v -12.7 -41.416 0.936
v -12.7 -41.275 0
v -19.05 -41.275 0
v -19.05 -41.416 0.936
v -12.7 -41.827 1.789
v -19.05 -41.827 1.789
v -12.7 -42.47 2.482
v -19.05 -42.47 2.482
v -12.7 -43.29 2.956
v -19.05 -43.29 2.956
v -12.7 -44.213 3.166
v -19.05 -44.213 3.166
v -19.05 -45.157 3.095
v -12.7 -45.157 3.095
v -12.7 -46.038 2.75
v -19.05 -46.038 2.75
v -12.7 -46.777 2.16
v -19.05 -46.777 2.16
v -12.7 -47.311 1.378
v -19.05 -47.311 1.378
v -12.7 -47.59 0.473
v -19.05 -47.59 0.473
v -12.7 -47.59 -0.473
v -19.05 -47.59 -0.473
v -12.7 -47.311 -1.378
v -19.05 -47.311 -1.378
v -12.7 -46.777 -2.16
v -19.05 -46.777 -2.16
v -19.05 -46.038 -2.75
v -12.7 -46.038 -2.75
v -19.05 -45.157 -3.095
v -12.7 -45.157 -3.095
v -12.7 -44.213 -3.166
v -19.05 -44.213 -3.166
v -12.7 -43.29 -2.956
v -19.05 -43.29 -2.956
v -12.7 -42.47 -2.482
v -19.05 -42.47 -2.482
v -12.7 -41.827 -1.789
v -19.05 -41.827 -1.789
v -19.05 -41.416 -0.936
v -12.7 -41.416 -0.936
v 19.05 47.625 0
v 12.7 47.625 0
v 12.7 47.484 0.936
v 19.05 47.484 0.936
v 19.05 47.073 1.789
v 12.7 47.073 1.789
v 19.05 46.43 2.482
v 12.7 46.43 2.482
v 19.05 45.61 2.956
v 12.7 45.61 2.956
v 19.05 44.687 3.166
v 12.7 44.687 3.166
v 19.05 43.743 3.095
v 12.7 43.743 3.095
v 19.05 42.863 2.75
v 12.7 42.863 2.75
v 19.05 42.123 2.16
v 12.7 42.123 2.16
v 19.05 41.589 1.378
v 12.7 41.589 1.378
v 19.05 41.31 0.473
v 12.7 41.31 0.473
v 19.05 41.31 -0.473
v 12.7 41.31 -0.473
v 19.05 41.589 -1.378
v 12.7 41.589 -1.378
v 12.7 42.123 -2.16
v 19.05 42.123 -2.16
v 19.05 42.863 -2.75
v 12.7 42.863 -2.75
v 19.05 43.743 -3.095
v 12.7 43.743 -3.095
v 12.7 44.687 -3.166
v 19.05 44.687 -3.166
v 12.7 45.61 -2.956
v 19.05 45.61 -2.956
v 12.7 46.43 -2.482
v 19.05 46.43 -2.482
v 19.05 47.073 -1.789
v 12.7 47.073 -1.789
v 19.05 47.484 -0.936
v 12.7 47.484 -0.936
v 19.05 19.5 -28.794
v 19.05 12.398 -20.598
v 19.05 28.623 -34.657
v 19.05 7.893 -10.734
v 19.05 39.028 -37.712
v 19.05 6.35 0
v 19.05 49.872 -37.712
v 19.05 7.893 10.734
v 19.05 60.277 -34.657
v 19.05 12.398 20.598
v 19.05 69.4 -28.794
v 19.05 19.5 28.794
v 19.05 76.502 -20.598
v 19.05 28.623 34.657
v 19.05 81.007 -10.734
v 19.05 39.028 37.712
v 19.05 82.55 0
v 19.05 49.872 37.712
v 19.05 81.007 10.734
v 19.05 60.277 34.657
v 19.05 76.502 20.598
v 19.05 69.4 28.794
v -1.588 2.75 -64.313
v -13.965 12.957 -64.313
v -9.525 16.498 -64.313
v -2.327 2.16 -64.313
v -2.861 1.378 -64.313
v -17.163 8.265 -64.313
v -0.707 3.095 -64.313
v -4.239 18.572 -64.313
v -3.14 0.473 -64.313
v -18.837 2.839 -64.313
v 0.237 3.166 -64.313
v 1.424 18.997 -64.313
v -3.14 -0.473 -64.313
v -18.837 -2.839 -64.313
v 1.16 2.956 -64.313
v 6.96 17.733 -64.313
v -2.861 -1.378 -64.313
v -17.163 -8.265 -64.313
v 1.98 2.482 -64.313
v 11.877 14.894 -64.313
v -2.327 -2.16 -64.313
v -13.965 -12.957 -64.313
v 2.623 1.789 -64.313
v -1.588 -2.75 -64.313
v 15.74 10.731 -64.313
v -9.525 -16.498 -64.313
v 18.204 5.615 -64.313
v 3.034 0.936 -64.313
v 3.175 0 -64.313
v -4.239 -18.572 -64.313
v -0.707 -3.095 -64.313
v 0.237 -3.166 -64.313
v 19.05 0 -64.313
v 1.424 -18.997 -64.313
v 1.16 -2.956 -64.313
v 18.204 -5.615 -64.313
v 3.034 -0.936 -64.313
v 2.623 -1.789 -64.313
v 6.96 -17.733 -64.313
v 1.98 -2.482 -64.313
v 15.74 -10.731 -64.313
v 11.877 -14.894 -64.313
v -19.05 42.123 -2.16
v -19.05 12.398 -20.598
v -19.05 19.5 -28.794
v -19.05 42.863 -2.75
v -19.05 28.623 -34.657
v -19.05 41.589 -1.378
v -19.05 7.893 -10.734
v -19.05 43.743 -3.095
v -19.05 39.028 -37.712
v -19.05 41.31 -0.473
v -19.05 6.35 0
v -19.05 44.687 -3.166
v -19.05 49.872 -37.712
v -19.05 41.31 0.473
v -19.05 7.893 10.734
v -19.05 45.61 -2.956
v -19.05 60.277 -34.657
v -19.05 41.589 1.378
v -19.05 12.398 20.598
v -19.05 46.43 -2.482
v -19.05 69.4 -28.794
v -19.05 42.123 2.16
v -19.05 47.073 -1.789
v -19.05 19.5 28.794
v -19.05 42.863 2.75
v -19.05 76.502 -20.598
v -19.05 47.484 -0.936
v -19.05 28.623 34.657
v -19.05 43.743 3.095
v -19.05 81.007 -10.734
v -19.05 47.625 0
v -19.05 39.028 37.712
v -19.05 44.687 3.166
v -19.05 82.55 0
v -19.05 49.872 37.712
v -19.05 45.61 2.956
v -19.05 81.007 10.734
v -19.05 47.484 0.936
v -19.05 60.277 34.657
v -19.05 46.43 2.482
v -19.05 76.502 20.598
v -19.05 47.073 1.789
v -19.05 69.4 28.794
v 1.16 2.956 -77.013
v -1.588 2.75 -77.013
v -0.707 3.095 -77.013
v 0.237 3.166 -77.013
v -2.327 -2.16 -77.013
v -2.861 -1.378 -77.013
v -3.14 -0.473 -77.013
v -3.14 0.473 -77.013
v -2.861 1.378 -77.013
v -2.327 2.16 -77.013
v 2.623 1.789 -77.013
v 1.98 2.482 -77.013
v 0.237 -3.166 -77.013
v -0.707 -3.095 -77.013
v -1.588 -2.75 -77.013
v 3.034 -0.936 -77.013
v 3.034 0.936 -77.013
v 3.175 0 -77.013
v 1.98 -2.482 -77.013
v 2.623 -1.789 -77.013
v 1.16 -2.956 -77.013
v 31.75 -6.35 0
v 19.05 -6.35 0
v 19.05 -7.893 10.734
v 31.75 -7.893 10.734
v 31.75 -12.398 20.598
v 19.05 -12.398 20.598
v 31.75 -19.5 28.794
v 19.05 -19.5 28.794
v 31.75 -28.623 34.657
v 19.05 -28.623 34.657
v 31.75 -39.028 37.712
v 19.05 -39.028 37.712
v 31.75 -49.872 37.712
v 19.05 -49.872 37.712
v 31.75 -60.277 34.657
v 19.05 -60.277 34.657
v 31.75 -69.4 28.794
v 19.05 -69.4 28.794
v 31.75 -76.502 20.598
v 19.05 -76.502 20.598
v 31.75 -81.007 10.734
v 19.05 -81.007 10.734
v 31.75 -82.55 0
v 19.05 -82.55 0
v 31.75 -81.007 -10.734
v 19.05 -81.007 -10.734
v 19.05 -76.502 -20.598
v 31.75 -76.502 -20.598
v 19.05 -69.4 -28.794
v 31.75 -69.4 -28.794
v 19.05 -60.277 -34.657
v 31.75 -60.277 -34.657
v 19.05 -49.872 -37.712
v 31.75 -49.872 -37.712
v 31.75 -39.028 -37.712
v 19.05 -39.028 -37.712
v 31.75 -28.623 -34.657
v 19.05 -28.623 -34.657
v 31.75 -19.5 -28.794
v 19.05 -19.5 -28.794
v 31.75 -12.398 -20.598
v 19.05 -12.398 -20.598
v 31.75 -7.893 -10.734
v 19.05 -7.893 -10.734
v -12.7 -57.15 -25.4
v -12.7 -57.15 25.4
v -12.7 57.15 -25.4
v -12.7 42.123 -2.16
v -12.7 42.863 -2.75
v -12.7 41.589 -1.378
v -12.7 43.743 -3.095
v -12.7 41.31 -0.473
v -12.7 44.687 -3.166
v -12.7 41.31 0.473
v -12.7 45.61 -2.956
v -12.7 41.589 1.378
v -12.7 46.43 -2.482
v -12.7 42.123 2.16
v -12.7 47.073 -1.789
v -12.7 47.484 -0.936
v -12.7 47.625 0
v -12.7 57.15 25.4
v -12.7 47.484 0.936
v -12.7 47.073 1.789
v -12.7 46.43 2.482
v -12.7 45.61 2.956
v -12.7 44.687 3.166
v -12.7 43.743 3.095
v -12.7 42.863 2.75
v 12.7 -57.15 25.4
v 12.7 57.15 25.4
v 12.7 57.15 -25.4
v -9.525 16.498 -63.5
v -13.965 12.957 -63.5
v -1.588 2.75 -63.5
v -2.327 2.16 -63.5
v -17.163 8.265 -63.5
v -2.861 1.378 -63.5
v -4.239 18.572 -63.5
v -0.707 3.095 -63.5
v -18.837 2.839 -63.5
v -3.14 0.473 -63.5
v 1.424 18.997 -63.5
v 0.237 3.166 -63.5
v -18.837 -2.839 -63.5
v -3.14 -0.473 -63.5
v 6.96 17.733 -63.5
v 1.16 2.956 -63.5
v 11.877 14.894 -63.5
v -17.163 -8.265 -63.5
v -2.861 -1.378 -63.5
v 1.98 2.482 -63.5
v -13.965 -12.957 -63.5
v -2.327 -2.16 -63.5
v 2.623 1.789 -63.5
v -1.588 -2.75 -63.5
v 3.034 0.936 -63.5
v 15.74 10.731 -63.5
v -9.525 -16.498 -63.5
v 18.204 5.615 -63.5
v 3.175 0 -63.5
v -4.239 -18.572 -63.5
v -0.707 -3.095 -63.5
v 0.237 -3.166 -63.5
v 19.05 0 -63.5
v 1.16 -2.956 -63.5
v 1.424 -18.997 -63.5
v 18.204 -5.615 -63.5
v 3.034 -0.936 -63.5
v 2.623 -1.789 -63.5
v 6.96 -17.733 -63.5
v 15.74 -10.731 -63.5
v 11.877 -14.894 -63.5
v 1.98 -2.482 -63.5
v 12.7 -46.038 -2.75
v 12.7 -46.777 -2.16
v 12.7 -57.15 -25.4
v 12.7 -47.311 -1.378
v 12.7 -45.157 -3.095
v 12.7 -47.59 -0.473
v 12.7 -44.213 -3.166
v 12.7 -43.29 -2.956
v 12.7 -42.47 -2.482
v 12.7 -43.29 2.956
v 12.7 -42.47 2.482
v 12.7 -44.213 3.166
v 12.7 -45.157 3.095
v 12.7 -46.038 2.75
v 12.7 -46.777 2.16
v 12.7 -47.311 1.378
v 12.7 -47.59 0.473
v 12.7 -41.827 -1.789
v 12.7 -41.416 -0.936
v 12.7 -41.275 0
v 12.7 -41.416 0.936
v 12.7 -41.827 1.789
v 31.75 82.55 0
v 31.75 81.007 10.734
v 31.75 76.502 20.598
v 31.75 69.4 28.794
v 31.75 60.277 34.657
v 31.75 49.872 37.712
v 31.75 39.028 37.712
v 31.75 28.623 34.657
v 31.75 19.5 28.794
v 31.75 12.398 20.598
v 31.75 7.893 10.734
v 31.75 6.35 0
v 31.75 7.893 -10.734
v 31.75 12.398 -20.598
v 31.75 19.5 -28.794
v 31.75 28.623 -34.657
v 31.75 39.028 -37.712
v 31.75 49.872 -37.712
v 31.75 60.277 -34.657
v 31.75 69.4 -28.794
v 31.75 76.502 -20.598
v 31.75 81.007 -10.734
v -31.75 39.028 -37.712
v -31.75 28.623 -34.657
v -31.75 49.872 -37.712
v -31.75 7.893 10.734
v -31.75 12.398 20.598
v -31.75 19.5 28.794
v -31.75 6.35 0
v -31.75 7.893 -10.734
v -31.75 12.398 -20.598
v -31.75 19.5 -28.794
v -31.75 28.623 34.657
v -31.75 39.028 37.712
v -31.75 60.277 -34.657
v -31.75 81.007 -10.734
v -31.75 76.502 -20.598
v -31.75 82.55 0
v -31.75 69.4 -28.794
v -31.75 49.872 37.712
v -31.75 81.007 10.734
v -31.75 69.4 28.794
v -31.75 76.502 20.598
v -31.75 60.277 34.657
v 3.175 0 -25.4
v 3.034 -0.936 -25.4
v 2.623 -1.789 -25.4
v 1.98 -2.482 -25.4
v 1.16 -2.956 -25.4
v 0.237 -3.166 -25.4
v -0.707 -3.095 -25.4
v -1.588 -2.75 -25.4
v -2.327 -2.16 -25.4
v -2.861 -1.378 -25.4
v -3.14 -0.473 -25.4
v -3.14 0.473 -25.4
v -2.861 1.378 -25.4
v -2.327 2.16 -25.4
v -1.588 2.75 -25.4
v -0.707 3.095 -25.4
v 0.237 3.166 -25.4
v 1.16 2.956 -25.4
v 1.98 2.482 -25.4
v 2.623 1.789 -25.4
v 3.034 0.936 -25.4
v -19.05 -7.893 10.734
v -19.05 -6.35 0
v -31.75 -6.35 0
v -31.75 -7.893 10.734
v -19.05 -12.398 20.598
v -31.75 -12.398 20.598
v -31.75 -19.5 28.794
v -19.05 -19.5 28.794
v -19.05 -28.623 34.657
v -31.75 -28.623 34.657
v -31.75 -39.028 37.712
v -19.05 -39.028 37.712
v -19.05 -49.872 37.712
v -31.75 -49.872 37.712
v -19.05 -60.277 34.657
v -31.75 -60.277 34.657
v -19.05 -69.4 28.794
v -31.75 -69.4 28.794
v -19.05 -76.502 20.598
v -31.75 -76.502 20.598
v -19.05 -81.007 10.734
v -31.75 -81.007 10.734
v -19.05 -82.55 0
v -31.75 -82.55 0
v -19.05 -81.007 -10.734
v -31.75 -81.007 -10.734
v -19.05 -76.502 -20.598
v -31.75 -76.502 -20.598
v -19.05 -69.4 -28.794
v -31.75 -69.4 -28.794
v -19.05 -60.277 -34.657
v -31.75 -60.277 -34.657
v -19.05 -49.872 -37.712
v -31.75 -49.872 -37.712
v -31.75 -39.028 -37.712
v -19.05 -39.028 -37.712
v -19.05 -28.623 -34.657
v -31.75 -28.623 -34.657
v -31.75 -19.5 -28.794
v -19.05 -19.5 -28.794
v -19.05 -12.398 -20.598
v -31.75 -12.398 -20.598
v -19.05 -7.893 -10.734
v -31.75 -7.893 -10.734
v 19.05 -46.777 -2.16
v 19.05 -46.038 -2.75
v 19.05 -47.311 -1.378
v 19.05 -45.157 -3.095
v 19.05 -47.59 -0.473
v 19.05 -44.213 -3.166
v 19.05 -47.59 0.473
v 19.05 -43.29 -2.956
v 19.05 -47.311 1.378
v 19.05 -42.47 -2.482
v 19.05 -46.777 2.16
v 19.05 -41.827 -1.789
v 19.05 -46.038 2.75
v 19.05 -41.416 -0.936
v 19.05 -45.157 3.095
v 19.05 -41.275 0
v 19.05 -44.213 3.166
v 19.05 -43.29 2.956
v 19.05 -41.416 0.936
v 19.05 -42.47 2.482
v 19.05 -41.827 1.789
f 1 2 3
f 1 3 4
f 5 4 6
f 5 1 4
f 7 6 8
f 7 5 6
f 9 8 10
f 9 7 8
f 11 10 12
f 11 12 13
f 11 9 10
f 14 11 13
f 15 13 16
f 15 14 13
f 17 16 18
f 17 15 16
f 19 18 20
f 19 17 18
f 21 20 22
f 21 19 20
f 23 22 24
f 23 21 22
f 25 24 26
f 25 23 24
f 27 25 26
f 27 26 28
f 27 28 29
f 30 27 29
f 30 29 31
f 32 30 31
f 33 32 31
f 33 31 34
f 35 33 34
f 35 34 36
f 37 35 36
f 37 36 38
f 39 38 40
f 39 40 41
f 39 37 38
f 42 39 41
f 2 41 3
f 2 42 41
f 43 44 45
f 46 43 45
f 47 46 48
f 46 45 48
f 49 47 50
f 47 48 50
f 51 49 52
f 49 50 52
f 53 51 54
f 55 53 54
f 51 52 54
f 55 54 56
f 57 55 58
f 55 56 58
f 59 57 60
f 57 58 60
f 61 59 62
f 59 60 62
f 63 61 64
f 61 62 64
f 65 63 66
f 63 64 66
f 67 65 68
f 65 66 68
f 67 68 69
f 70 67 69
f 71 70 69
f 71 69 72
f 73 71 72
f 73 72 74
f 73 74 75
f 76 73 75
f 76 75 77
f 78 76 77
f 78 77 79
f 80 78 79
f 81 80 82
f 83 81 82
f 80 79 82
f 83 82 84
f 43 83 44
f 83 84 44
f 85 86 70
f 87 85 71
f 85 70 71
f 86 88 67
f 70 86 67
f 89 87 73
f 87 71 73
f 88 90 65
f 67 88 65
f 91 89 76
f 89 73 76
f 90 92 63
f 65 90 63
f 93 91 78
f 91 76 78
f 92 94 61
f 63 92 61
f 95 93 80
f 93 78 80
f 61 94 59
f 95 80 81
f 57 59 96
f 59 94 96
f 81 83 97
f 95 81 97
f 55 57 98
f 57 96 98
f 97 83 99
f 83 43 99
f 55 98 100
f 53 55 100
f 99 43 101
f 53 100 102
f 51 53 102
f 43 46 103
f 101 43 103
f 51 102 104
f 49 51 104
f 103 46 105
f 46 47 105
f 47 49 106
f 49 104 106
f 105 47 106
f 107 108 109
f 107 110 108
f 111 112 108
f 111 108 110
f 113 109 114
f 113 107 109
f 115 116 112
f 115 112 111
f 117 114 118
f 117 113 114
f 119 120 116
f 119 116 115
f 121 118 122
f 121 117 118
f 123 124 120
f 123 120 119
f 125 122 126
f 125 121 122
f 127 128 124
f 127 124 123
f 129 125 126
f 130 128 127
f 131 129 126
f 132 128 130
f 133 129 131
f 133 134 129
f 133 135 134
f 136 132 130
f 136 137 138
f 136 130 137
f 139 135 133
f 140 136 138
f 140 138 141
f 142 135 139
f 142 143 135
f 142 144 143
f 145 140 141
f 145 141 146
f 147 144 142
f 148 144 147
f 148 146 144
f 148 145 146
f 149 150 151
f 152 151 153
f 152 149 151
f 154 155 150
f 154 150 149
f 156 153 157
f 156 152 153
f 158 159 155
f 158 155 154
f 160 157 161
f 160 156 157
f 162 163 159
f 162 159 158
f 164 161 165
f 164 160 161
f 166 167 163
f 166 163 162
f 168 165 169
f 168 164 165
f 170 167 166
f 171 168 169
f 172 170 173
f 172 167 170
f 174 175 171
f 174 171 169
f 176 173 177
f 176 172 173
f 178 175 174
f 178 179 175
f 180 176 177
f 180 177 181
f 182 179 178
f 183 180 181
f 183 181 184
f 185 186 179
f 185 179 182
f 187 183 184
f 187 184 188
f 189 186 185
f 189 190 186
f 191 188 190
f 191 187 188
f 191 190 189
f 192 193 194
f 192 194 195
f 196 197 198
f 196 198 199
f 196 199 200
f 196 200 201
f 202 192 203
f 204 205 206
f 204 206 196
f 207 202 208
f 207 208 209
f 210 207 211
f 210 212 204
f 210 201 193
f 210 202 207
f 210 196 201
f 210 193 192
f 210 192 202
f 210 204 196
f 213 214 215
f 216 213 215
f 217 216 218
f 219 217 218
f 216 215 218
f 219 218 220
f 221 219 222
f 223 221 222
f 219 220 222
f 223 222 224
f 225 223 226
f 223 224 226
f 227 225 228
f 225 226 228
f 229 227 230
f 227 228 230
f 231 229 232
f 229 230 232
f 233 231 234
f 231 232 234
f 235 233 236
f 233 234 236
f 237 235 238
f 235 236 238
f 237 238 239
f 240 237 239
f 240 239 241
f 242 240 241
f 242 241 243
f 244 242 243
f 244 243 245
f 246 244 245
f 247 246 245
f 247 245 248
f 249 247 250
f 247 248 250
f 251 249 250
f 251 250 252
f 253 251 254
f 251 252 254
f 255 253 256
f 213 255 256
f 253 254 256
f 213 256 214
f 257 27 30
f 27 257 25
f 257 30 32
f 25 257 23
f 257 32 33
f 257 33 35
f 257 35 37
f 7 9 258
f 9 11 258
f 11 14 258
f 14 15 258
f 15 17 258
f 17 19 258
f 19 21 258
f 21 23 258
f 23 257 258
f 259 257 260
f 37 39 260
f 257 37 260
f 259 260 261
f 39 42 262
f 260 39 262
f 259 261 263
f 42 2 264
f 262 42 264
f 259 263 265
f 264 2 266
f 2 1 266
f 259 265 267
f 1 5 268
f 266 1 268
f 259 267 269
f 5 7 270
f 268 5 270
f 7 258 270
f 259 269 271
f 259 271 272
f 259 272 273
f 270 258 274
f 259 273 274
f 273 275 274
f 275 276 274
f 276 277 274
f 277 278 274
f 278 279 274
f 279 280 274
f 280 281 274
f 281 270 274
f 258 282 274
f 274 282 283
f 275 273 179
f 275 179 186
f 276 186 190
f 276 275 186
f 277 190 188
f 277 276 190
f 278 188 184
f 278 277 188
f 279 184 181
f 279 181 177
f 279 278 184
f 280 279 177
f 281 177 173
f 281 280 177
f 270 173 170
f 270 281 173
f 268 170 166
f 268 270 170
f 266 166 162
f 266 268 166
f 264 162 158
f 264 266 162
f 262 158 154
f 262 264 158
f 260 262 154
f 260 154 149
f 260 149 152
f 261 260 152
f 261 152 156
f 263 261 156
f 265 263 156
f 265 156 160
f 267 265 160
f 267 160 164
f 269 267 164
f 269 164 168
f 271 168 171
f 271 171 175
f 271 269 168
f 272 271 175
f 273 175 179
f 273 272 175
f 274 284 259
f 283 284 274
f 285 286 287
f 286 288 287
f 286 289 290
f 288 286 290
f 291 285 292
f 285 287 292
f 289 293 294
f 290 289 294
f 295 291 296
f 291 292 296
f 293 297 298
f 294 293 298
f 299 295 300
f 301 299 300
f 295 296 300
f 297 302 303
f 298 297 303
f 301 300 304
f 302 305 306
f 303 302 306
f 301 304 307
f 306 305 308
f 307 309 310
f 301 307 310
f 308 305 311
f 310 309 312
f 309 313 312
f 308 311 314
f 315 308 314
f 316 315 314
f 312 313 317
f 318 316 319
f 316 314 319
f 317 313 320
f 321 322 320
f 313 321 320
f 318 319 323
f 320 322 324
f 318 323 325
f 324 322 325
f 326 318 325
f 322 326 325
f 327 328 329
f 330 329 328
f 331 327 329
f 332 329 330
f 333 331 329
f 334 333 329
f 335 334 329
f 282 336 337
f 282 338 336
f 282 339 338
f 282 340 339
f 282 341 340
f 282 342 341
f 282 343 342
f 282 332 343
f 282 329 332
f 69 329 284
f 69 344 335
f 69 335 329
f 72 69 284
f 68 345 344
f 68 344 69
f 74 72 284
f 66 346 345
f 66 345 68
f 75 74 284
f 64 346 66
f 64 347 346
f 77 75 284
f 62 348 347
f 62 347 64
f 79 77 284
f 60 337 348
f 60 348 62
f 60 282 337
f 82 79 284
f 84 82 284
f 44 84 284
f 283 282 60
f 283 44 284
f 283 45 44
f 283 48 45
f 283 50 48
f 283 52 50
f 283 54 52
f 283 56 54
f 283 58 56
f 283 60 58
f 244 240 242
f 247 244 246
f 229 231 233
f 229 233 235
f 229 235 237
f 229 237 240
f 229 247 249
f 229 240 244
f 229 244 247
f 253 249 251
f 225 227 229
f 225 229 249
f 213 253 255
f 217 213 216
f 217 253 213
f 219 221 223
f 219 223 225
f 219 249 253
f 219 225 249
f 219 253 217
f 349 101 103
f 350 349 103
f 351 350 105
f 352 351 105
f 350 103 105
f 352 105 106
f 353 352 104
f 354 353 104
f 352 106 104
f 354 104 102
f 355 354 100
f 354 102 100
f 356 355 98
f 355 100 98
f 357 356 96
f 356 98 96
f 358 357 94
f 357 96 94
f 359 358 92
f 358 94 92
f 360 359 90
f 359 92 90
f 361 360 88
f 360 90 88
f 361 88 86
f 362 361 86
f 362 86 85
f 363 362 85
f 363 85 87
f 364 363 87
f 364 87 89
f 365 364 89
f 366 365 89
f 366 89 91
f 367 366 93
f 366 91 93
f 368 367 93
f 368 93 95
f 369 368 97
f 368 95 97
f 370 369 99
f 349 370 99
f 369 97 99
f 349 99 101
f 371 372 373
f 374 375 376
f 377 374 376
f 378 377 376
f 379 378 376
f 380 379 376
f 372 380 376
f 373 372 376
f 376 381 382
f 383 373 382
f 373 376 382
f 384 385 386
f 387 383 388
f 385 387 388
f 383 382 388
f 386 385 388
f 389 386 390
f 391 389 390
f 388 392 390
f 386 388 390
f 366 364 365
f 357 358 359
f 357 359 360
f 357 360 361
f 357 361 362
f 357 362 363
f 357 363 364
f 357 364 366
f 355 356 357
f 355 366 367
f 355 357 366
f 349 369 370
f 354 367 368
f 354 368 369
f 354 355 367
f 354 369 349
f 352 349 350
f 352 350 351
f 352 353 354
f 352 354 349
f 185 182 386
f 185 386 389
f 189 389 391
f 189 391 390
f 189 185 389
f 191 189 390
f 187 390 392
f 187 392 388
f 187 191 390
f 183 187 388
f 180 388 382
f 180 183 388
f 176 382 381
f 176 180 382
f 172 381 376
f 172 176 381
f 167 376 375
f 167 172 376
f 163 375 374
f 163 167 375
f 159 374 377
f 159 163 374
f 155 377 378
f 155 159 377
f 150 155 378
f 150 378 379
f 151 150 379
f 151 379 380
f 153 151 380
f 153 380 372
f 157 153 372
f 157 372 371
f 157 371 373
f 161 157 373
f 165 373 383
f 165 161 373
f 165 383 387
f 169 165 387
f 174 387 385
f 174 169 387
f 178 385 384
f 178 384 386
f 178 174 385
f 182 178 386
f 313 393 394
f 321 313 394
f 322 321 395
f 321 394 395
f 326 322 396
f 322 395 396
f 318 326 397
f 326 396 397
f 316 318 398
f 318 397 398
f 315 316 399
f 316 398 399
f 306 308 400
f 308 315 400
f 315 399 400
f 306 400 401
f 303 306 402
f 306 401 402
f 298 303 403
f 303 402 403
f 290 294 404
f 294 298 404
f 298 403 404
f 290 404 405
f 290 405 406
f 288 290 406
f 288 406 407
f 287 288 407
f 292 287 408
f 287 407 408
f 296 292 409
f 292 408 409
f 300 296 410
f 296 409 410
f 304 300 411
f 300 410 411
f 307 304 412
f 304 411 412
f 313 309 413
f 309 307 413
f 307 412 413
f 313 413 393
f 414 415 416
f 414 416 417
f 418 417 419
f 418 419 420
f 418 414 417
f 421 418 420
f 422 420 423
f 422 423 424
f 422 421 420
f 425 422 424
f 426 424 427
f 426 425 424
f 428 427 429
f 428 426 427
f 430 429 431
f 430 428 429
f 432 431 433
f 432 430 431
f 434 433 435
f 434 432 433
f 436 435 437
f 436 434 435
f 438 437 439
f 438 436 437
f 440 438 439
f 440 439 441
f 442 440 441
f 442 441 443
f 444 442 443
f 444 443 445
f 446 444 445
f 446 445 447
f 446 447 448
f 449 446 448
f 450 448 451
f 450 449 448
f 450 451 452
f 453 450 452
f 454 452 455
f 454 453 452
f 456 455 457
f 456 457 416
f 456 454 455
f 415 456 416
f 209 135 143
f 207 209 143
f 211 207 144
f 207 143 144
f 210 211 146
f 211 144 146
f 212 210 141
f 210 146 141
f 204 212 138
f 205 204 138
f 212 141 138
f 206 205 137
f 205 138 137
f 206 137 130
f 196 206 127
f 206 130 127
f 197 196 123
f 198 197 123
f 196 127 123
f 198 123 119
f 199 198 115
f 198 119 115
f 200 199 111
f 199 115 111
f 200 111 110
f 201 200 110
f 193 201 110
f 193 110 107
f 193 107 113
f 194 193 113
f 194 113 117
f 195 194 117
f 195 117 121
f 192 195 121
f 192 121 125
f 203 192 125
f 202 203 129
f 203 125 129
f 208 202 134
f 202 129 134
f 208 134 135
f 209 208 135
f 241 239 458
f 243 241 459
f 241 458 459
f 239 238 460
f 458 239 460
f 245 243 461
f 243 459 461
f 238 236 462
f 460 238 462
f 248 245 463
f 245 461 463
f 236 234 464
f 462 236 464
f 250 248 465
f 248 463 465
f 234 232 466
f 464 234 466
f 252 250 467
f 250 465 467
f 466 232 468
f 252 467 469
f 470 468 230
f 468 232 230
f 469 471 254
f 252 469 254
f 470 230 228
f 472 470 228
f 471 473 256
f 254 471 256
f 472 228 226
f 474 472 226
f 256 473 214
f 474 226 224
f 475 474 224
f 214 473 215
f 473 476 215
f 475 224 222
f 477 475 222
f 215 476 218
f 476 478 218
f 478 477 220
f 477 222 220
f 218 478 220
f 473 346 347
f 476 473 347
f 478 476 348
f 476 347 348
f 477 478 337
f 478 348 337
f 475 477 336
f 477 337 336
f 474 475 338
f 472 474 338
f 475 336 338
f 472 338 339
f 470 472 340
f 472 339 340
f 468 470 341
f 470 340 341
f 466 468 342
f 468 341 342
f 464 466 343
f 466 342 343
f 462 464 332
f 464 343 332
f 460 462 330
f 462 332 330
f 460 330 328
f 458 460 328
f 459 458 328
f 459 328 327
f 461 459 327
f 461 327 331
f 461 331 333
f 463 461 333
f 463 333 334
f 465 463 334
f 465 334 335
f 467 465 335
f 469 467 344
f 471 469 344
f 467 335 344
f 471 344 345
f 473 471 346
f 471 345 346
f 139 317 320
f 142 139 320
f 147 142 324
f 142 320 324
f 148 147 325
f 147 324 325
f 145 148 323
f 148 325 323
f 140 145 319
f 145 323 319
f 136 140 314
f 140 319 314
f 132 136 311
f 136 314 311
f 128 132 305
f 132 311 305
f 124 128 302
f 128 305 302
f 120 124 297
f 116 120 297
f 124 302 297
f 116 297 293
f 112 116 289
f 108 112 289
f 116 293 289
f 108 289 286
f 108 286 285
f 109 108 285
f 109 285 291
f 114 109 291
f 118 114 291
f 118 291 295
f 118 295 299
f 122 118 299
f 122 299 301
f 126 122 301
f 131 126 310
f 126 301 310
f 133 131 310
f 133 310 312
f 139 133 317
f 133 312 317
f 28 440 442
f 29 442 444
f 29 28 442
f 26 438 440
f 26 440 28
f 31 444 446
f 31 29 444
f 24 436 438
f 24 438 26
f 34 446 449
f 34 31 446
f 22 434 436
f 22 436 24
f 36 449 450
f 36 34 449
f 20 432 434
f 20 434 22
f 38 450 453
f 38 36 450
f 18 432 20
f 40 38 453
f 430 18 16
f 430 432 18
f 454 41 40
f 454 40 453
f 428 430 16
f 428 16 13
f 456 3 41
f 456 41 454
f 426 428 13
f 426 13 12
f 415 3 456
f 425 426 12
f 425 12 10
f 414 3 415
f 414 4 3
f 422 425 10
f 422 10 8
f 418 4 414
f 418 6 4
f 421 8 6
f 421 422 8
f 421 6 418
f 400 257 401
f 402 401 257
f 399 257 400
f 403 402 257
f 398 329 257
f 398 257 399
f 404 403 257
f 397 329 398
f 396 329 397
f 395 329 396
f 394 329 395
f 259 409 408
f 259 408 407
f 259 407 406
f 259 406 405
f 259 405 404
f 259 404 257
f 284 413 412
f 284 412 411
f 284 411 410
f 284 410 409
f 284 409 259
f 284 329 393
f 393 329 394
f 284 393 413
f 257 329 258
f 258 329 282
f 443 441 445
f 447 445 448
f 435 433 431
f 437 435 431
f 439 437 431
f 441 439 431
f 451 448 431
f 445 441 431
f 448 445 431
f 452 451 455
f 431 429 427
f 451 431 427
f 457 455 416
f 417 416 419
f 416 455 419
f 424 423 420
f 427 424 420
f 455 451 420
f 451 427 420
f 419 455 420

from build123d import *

# Parameters (mm, degrees)
F0_W      = 114.3
F0_H      = 50.8
F1_DEPTH  = 12.7
F2_R      = 3.175
F3_DEPTH  = 38.1
F4_R      = 3.175
F5_DEPTH  = 6.35
F6_R      = 38.1
F7_DEPTH  = 12.7
F9_R      = 19.05
F10_DEPTH = 0.8128
F11_R     = 3.175
F12_DEPTH = 12.7


with BuildPart() as f1:
    # F0 (on Right) → F1 (new body, symmetric)
    with BuildSketch(Plane.YZ):
        Rectangle(F0_W, F0_H)
    extrude(amount=F1_DEPTH, both=True)

    # F2 (on face) → F3 (join)
    with BuildSketch(Plane(origin=(0, 0, -25.4), x_dir=(1, 0, 0), z_dir=(0, 0, -1))):
        Circle(F2_R)
    extrude(amount=F3_DEPTH)

    # F4 (on face) → F5 (join)
    with BuildSketch(Plane.YZ.offset(12.7)):
        with Locations((-44.45, 0)):
            Circle(F4_R)
        with Locations((44.45, 0)):
            Circle(F4_R)
    extrude(amount=F5_DEPTH)

    # F6 (on face) → F7 (join)
    with BuildSketch(Plane.YZ.offset(19.05)):
        with Locations((-44.45, 0)):
            Circle(F6_R)
        with Locations((44.45, 0)):
            Circle(F6_R)
    extrude(amount=F7_DEPTH)

    # F8: F1 across plane


with BuildPart() as f1_1:
    add(f1.part)
    add(f1.part.mirror(Plane.YZ))

    # F9 (on face) → F10 (join)
    with BuildSketch(Plane(origin=(0, 0, -63.5), x_dir=(1, 0, 0), z_dir=(0, 0, -1))):
        Circle(F9_R)
    extrude(amount=F10_DEPTH)

    # F11 (on face) → F12 (join)
    with BuildSketch(Plane(origin=(0, 0, -64.3128), x_dir=(1, 0, 0), z_dir=(0, 0, -1))):
        Circle(F11_R)
    extrude(amount=F12_DEPTH)


solid = f1_1.part
